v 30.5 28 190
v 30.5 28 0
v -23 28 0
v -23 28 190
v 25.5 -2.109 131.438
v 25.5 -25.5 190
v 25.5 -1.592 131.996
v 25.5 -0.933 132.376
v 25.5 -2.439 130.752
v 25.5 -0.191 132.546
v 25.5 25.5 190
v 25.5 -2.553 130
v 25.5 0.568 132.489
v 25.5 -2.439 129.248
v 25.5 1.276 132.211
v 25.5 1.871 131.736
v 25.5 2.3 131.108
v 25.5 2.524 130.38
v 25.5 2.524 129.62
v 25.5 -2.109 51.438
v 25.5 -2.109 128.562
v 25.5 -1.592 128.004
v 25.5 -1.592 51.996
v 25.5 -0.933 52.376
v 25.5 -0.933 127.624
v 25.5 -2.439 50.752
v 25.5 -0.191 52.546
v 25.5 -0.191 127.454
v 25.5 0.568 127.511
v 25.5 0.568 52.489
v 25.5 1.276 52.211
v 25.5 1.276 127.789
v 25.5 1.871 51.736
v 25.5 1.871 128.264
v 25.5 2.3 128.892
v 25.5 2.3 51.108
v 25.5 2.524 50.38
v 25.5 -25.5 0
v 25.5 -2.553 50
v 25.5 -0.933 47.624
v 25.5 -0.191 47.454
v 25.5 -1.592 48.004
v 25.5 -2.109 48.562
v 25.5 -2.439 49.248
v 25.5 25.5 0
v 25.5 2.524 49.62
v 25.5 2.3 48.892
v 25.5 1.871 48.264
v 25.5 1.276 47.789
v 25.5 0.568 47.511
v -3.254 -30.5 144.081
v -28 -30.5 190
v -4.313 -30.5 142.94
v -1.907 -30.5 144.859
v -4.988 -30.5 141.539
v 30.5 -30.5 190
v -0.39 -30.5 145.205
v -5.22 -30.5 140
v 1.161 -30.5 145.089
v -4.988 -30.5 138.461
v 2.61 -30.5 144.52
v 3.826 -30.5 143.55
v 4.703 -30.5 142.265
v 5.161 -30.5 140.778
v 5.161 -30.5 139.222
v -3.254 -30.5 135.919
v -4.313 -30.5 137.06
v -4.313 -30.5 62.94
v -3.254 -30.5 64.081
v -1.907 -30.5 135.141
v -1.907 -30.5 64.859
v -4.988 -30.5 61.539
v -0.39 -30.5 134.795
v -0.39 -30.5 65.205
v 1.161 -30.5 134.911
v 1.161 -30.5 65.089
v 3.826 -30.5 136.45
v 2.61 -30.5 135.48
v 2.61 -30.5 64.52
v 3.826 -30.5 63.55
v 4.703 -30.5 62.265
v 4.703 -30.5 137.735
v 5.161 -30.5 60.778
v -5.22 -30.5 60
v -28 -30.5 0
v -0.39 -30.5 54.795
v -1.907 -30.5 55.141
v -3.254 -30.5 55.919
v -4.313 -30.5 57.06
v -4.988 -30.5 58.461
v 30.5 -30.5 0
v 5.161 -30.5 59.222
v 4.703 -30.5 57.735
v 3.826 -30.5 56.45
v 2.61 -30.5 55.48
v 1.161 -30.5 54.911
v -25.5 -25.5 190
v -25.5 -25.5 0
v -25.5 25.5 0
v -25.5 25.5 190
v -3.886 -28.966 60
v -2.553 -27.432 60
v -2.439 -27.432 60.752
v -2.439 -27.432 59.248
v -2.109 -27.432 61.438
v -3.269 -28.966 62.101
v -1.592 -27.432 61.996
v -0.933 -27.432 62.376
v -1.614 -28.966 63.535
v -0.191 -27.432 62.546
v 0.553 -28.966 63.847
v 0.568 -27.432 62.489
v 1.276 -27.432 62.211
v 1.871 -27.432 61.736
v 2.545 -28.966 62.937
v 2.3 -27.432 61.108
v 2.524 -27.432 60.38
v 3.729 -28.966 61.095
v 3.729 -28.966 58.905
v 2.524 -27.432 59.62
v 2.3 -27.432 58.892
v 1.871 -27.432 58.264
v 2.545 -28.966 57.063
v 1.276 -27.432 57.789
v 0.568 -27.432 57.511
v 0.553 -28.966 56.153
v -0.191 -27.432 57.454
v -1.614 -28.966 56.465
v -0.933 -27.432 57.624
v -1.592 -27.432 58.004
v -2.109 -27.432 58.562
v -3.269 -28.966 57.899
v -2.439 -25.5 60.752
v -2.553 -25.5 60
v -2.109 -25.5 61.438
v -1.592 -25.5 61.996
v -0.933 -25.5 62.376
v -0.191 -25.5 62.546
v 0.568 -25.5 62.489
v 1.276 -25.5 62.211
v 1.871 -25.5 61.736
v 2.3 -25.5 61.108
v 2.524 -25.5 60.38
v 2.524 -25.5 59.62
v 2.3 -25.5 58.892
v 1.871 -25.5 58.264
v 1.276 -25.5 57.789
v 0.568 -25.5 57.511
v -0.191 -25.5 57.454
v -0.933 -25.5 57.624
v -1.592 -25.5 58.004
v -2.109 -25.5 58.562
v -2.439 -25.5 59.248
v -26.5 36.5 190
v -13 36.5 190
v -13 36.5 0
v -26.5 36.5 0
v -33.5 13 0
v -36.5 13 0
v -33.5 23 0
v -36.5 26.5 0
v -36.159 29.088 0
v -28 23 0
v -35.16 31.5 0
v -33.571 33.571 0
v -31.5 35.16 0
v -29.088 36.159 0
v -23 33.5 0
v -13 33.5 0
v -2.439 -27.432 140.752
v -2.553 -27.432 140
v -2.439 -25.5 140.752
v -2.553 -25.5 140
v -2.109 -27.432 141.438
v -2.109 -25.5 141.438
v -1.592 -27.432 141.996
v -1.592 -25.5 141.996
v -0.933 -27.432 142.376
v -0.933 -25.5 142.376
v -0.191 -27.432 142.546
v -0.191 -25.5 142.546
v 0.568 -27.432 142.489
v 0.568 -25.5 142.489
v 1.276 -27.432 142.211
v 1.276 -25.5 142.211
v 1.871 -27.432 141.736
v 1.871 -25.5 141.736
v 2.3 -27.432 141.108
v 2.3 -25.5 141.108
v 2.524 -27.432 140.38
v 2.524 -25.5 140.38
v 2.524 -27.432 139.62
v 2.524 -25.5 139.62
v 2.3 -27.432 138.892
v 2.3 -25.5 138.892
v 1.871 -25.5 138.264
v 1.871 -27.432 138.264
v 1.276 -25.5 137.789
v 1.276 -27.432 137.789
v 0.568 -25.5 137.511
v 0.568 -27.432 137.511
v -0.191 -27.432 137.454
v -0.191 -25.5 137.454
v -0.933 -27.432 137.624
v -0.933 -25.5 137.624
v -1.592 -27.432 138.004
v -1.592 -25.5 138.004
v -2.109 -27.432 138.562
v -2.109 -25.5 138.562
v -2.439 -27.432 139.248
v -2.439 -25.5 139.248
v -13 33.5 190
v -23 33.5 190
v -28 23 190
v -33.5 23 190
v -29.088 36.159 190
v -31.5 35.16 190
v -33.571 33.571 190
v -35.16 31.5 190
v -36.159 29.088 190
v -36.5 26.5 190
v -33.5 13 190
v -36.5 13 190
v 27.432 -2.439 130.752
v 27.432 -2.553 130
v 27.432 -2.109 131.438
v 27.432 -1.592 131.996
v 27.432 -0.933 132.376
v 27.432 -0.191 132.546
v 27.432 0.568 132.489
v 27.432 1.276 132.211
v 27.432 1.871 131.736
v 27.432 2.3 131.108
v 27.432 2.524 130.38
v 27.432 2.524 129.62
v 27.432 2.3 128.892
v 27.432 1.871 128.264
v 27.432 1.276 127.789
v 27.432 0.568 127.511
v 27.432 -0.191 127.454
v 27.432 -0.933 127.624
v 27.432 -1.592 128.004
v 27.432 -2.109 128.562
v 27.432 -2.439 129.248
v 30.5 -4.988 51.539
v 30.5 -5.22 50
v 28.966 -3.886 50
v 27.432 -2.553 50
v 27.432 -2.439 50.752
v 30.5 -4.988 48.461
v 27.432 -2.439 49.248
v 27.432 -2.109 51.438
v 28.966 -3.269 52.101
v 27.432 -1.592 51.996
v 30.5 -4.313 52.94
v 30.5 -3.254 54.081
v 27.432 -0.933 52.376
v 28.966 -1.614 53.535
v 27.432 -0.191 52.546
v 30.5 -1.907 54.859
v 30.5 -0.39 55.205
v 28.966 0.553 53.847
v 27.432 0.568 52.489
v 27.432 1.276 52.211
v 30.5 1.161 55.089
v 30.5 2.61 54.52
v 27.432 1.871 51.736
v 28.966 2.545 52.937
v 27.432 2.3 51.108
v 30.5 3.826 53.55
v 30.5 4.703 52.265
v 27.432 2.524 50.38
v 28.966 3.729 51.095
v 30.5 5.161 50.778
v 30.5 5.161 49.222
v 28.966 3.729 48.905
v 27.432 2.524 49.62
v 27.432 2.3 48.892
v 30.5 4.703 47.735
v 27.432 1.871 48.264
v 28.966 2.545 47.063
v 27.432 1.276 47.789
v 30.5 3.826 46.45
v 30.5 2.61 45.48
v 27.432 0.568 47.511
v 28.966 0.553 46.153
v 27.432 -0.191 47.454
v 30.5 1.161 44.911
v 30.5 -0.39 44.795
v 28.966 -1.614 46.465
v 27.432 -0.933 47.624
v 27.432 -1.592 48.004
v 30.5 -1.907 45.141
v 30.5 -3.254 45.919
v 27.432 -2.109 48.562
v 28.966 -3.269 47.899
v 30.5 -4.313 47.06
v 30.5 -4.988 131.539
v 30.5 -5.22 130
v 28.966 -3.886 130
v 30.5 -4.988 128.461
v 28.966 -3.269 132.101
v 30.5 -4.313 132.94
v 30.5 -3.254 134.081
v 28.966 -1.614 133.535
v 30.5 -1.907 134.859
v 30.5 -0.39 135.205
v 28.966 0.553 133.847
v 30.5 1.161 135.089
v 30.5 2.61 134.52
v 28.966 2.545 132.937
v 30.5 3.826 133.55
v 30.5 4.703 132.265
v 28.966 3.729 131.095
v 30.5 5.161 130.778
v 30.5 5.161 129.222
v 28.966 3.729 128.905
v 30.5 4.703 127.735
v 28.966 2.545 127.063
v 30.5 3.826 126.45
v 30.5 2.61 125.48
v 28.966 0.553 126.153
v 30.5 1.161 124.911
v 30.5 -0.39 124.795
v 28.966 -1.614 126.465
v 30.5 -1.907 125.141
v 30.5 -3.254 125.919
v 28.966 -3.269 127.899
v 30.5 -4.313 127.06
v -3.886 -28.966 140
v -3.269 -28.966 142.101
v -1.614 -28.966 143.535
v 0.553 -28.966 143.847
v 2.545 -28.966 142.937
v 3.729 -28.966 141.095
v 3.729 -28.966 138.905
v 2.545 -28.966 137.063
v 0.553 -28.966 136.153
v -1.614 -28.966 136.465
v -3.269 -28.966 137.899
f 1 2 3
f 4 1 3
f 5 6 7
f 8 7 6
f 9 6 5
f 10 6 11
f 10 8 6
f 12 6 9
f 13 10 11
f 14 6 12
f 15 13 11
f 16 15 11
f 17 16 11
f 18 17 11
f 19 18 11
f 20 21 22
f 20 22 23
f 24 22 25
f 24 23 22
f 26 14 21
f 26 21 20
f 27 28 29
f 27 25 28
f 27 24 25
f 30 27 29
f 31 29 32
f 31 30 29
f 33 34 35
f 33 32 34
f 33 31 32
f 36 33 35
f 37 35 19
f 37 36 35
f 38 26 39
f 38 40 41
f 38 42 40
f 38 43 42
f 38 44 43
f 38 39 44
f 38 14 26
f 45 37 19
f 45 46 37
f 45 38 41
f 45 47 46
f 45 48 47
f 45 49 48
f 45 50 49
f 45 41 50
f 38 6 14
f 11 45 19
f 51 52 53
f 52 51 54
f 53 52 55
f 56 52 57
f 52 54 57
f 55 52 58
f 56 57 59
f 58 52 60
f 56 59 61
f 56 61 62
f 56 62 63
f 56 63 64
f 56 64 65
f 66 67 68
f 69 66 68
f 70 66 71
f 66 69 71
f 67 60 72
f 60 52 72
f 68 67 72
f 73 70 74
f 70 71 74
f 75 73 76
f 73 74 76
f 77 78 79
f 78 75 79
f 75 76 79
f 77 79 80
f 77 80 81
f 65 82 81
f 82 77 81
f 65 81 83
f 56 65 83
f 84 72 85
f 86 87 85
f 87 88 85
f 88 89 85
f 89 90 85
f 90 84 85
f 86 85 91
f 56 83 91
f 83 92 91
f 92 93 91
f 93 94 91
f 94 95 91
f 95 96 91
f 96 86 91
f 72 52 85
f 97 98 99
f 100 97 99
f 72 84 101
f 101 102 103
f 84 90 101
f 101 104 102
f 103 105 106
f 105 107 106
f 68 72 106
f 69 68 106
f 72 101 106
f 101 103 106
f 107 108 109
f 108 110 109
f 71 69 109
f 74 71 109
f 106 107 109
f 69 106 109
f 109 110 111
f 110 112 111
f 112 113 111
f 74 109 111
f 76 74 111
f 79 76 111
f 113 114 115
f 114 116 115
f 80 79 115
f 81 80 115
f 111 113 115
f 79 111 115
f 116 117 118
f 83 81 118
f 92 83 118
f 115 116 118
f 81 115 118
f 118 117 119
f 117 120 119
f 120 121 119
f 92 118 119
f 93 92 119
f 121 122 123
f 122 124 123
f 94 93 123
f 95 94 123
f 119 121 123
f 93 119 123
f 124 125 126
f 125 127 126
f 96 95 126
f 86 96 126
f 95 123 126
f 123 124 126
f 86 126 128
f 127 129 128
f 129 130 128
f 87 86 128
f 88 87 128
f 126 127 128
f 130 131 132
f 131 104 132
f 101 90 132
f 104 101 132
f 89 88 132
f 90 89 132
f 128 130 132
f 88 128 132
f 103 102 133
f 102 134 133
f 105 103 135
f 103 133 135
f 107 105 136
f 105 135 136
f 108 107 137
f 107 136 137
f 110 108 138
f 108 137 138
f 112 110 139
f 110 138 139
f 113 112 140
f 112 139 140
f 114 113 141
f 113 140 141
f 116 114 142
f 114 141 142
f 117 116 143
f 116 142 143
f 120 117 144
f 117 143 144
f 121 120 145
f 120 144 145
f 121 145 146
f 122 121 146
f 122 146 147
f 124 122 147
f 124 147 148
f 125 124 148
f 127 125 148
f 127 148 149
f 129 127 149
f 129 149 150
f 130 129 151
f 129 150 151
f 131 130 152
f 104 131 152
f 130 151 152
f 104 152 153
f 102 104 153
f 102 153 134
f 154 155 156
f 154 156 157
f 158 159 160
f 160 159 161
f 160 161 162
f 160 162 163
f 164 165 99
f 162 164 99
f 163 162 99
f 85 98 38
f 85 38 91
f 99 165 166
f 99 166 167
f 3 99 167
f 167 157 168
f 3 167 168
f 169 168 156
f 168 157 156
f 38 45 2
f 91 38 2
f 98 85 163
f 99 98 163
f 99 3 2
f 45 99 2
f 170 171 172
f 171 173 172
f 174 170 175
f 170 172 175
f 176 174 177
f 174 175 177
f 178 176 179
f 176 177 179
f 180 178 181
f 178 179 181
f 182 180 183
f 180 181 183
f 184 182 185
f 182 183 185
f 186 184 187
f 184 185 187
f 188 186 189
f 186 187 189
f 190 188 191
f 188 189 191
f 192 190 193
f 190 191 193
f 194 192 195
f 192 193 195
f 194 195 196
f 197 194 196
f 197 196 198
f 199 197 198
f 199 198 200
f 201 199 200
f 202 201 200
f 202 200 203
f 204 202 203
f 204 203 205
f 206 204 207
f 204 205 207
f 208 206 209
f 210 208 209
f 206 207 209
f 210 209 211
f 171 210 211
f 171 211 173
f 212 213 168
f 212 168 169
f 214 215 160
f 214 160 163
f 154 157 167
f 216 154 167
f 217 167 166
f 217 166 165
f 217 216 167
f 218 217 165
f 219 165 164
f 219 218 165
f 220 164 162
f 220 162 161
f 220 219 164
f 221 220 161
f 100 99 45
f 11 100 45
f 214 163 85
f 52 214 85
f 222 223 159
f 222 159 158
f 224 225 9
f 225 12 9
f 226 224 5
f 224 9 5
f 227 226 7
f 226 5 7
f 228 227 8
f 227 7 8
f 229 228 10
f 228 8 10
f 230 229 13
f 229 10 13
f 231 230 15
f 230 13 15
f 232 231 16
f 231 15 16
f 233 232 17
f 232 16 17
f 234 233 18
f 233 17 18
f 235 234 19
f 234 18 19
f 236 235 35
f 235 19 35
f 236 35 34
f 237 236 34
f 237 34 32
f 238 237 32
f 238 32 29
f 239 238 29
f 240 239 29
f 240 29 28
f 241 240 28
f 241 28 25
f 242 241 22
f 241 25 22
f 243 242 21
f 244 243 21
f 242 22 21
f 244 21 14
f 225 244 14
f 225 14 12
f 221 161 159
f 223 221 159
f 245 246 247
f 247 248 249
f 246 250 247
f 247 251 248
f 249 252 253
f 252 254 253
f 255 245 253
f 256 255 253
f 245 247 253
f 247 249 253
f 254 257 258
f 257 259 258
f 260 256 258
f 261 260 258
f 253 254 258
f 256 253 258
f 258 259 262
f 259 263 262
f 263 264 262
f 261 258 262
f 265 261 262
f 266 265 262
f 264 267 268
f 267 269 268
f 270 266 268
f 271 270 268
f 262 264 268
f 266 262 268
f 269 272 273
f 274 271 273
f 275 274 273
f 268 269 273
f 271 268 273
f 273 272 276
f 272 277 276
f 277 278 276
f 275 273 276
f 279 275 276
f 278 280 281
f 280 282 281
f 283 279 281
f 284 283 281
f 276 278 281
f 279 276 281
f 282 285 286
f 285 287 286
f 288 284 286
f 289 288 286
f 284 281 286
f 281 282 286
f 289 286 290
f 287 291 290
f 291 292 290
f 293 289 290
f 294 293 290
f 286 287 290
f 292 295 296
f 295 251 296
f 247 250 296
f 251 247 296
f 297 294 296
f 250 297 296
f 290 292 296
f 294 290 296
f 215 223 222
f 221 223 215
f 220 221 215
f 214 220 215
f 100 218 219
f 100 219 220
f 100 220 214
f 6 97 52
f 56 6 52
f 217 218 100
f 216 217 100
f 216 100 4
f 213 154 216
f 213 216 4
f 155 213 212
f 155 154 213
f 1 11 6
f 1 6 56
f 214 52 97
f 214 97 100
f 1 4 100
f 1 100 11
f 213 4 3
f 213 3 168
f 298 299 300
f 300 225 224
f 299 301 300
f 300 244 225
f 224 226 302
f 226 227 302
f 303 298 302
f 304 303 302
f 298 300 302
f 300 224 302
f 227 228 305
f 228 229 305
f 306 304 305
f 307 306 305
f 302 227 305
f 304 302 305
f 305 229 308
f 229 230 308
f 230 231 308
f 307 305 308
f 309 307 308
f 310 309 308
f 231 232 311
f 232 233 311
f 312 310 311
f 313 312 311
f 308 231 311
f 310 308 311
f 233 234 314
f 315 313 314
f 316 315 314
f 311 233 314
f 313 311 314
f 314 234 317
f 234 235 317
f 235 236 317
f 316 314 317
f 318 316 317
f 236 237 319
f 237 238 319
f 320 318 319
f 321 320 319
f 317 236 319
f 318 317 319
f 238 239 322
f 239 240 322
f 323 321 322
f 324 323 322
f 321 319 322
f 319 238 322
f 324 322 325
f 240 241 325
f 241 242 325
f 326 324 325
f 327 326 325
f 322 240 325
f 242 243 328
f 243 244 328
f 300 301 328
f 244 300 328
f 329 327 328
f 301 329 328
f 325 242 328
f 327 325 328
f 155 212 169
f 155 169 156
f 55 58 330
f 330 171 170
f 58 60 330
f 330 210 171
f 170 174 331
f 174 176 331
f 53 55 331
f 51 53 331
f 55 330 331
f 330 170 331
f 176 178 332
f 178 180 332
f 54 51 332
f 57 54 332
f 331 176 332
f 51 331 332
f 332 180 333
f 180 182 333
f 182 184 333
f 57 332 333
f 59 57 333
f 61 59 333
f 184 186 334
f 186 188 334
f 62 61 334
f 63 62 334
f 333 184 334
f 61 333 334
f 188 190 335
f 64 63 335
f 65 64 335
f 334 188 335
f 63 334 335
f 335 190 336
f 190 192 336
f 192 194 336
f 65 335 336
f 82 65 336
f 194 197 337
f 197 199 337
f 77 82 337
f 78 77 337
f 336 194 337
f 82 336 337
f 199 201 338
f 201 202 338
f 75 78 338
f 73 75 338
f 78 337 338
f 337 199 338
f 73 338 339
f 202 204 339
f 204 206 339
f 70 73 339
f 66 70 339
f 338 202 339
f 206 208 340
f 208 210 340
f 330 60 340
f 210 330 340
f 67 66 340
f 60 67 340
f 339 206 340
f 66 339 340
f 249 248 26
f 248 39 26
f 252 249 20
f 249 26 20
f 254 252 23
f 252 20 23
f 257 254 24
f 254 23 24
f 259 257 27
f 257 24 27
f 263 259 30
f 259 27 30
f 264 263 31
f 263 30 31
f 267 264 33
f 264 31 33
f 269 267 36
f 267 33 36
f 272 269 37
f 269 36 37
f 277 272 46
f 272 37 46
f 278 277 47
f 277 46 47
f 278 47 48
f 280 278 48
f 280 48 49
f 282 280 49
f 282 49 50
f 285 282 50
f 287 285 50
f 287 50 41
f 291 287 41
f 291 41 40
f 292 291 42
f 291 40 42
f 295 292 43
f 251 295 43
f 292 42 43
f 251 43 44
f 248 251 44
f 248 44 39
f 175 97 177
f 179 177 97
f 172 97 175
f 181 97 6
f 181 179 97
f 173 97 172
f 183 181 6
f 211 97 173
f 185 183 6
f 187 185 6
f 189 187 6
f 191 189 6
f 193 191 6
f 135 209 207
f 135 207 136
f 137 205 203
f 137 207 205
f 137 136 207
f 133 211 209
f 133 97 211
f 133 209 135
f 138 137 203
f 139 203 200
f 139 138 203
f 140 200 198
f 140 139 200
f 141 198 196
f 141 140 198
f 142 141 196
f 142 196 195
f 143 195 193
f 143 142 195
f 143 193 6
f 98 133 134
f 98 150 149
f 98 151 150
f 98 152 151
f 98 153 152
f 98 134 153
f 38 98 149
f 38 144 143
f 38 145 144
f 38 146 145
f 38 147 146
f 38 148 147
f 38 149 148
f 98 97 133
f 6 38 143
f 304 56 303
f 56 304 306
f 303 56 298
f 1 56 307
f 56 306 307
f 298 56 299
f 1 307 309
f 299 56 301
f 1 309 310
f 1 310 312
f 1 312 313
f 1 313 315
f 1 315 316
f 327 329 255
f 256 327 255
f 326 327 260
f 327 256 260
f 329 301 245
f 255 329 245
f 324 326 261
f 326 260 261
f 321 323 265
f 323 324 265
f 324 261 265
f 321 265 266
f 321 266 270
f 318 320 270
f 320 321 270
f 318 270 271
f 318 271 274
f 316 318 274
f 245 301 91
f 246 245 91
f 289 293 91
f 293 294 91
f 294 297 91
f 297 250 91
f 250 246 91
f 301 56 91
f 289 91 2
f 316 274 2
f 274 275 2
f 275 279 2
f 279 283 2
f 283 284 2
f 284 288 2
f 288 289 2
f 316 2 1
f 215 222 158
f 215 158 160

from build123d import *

# Parameters (mm, degrees)
F0_W           = 5
F0_H           = 5.5
F0_W_2         = 5.5
F0_H_2         = 5
F0_W_3         = 51
F0_H_3         = 51
F1_DEPTH       = 190
F2_R           = 10
F4_D           = 5.1054
F4_DEPTH       = 12
F4_CSINK_D     = 10.4394
F4_CSINK_ANGLE = 82
F4_TIP         = 1.5338169022
F6_D           = 5.1054
F6_DEPTH       = 12
F6_CSINK_D     = 10.4394
F6_CSINK_ANGLE = 82
F6_TIP         = 1.5338169022


with BuildPart() as f1:
    # F0 (on Top) → F1 (new body)
    with BuildSketch(Plane.XY):
        Polygon((-33.5, 28), (-28, 28), (-28, 33.5), (-28, 36.5), (-36.5, 36.5), (-36.5, 28), align=None)
        Polygon((-28, 36.5), (-28, 33.5), (-23, 33.5), (-13, 33.5), (-13, 36.5), align=None)
        with Locations((-25.5, 30.75)):
            Rectangle(F0_W, F0_H)
        with Locations((-30.75, 25.5)):
            Rectangle(F0_W_2, F0_H_2)
        Polygon((-33.5, 23), (-33.5, 28), (-36.5, 28), (-36.5, 13), (-33.5, 13), align=None)
        Polygon((-23, 28), (-28, 28), (-28, 23), (-28, -30.5), (30.5, -30.5), (30.5, 28), align=None)
        Rectangle(F0_W_3, F0_H_3, mode=Mode.SUBTRACT)
    extrude(amount=F1_DEPTH)

    # F2
    f2_edges = [f1.edges().sort_by_distance(p)[0] for p in [
        (-36.5, 36.5, 95),
    ]]
    fillet(f2_edges, radius=F2_R)

    # F4
    with Locations(Plane.XZ.offset(30.5)):
        with Locations((0, 140), (0, 60)):
            CounterSinkHole(F4_D / 2, F4_CSINK_D / 2, depth=F4_DEPTH, counter_sink_angle=F4_CSINK_ANGLE)
            with Locations((0, 0, -(F4_DEPTH + F4_TIP / 2))):  # 118° drill point
                Cone(0, F4_D / 2, F4_TIP, mode=Mode.SUBTRACT)

    # F6
    with Locations(Plane.YZ.offset(30.5)):
        with Locations((0, 130), (0, 50)):
            CounterSinkHole(F6_D / 2, F6_CSINK_D / 2, depth=F6_DEPTH, counter_sink_angle=F6_CSINK_ANGLE)
            with Locations((0, 0, -(F6_DEPTH + F6_TIP / 2))):  # 118° drill point
                Cone(0, F6_D / 2, F6_TIP, mode=Mode.SUBTRACT)


solid = f1.part
